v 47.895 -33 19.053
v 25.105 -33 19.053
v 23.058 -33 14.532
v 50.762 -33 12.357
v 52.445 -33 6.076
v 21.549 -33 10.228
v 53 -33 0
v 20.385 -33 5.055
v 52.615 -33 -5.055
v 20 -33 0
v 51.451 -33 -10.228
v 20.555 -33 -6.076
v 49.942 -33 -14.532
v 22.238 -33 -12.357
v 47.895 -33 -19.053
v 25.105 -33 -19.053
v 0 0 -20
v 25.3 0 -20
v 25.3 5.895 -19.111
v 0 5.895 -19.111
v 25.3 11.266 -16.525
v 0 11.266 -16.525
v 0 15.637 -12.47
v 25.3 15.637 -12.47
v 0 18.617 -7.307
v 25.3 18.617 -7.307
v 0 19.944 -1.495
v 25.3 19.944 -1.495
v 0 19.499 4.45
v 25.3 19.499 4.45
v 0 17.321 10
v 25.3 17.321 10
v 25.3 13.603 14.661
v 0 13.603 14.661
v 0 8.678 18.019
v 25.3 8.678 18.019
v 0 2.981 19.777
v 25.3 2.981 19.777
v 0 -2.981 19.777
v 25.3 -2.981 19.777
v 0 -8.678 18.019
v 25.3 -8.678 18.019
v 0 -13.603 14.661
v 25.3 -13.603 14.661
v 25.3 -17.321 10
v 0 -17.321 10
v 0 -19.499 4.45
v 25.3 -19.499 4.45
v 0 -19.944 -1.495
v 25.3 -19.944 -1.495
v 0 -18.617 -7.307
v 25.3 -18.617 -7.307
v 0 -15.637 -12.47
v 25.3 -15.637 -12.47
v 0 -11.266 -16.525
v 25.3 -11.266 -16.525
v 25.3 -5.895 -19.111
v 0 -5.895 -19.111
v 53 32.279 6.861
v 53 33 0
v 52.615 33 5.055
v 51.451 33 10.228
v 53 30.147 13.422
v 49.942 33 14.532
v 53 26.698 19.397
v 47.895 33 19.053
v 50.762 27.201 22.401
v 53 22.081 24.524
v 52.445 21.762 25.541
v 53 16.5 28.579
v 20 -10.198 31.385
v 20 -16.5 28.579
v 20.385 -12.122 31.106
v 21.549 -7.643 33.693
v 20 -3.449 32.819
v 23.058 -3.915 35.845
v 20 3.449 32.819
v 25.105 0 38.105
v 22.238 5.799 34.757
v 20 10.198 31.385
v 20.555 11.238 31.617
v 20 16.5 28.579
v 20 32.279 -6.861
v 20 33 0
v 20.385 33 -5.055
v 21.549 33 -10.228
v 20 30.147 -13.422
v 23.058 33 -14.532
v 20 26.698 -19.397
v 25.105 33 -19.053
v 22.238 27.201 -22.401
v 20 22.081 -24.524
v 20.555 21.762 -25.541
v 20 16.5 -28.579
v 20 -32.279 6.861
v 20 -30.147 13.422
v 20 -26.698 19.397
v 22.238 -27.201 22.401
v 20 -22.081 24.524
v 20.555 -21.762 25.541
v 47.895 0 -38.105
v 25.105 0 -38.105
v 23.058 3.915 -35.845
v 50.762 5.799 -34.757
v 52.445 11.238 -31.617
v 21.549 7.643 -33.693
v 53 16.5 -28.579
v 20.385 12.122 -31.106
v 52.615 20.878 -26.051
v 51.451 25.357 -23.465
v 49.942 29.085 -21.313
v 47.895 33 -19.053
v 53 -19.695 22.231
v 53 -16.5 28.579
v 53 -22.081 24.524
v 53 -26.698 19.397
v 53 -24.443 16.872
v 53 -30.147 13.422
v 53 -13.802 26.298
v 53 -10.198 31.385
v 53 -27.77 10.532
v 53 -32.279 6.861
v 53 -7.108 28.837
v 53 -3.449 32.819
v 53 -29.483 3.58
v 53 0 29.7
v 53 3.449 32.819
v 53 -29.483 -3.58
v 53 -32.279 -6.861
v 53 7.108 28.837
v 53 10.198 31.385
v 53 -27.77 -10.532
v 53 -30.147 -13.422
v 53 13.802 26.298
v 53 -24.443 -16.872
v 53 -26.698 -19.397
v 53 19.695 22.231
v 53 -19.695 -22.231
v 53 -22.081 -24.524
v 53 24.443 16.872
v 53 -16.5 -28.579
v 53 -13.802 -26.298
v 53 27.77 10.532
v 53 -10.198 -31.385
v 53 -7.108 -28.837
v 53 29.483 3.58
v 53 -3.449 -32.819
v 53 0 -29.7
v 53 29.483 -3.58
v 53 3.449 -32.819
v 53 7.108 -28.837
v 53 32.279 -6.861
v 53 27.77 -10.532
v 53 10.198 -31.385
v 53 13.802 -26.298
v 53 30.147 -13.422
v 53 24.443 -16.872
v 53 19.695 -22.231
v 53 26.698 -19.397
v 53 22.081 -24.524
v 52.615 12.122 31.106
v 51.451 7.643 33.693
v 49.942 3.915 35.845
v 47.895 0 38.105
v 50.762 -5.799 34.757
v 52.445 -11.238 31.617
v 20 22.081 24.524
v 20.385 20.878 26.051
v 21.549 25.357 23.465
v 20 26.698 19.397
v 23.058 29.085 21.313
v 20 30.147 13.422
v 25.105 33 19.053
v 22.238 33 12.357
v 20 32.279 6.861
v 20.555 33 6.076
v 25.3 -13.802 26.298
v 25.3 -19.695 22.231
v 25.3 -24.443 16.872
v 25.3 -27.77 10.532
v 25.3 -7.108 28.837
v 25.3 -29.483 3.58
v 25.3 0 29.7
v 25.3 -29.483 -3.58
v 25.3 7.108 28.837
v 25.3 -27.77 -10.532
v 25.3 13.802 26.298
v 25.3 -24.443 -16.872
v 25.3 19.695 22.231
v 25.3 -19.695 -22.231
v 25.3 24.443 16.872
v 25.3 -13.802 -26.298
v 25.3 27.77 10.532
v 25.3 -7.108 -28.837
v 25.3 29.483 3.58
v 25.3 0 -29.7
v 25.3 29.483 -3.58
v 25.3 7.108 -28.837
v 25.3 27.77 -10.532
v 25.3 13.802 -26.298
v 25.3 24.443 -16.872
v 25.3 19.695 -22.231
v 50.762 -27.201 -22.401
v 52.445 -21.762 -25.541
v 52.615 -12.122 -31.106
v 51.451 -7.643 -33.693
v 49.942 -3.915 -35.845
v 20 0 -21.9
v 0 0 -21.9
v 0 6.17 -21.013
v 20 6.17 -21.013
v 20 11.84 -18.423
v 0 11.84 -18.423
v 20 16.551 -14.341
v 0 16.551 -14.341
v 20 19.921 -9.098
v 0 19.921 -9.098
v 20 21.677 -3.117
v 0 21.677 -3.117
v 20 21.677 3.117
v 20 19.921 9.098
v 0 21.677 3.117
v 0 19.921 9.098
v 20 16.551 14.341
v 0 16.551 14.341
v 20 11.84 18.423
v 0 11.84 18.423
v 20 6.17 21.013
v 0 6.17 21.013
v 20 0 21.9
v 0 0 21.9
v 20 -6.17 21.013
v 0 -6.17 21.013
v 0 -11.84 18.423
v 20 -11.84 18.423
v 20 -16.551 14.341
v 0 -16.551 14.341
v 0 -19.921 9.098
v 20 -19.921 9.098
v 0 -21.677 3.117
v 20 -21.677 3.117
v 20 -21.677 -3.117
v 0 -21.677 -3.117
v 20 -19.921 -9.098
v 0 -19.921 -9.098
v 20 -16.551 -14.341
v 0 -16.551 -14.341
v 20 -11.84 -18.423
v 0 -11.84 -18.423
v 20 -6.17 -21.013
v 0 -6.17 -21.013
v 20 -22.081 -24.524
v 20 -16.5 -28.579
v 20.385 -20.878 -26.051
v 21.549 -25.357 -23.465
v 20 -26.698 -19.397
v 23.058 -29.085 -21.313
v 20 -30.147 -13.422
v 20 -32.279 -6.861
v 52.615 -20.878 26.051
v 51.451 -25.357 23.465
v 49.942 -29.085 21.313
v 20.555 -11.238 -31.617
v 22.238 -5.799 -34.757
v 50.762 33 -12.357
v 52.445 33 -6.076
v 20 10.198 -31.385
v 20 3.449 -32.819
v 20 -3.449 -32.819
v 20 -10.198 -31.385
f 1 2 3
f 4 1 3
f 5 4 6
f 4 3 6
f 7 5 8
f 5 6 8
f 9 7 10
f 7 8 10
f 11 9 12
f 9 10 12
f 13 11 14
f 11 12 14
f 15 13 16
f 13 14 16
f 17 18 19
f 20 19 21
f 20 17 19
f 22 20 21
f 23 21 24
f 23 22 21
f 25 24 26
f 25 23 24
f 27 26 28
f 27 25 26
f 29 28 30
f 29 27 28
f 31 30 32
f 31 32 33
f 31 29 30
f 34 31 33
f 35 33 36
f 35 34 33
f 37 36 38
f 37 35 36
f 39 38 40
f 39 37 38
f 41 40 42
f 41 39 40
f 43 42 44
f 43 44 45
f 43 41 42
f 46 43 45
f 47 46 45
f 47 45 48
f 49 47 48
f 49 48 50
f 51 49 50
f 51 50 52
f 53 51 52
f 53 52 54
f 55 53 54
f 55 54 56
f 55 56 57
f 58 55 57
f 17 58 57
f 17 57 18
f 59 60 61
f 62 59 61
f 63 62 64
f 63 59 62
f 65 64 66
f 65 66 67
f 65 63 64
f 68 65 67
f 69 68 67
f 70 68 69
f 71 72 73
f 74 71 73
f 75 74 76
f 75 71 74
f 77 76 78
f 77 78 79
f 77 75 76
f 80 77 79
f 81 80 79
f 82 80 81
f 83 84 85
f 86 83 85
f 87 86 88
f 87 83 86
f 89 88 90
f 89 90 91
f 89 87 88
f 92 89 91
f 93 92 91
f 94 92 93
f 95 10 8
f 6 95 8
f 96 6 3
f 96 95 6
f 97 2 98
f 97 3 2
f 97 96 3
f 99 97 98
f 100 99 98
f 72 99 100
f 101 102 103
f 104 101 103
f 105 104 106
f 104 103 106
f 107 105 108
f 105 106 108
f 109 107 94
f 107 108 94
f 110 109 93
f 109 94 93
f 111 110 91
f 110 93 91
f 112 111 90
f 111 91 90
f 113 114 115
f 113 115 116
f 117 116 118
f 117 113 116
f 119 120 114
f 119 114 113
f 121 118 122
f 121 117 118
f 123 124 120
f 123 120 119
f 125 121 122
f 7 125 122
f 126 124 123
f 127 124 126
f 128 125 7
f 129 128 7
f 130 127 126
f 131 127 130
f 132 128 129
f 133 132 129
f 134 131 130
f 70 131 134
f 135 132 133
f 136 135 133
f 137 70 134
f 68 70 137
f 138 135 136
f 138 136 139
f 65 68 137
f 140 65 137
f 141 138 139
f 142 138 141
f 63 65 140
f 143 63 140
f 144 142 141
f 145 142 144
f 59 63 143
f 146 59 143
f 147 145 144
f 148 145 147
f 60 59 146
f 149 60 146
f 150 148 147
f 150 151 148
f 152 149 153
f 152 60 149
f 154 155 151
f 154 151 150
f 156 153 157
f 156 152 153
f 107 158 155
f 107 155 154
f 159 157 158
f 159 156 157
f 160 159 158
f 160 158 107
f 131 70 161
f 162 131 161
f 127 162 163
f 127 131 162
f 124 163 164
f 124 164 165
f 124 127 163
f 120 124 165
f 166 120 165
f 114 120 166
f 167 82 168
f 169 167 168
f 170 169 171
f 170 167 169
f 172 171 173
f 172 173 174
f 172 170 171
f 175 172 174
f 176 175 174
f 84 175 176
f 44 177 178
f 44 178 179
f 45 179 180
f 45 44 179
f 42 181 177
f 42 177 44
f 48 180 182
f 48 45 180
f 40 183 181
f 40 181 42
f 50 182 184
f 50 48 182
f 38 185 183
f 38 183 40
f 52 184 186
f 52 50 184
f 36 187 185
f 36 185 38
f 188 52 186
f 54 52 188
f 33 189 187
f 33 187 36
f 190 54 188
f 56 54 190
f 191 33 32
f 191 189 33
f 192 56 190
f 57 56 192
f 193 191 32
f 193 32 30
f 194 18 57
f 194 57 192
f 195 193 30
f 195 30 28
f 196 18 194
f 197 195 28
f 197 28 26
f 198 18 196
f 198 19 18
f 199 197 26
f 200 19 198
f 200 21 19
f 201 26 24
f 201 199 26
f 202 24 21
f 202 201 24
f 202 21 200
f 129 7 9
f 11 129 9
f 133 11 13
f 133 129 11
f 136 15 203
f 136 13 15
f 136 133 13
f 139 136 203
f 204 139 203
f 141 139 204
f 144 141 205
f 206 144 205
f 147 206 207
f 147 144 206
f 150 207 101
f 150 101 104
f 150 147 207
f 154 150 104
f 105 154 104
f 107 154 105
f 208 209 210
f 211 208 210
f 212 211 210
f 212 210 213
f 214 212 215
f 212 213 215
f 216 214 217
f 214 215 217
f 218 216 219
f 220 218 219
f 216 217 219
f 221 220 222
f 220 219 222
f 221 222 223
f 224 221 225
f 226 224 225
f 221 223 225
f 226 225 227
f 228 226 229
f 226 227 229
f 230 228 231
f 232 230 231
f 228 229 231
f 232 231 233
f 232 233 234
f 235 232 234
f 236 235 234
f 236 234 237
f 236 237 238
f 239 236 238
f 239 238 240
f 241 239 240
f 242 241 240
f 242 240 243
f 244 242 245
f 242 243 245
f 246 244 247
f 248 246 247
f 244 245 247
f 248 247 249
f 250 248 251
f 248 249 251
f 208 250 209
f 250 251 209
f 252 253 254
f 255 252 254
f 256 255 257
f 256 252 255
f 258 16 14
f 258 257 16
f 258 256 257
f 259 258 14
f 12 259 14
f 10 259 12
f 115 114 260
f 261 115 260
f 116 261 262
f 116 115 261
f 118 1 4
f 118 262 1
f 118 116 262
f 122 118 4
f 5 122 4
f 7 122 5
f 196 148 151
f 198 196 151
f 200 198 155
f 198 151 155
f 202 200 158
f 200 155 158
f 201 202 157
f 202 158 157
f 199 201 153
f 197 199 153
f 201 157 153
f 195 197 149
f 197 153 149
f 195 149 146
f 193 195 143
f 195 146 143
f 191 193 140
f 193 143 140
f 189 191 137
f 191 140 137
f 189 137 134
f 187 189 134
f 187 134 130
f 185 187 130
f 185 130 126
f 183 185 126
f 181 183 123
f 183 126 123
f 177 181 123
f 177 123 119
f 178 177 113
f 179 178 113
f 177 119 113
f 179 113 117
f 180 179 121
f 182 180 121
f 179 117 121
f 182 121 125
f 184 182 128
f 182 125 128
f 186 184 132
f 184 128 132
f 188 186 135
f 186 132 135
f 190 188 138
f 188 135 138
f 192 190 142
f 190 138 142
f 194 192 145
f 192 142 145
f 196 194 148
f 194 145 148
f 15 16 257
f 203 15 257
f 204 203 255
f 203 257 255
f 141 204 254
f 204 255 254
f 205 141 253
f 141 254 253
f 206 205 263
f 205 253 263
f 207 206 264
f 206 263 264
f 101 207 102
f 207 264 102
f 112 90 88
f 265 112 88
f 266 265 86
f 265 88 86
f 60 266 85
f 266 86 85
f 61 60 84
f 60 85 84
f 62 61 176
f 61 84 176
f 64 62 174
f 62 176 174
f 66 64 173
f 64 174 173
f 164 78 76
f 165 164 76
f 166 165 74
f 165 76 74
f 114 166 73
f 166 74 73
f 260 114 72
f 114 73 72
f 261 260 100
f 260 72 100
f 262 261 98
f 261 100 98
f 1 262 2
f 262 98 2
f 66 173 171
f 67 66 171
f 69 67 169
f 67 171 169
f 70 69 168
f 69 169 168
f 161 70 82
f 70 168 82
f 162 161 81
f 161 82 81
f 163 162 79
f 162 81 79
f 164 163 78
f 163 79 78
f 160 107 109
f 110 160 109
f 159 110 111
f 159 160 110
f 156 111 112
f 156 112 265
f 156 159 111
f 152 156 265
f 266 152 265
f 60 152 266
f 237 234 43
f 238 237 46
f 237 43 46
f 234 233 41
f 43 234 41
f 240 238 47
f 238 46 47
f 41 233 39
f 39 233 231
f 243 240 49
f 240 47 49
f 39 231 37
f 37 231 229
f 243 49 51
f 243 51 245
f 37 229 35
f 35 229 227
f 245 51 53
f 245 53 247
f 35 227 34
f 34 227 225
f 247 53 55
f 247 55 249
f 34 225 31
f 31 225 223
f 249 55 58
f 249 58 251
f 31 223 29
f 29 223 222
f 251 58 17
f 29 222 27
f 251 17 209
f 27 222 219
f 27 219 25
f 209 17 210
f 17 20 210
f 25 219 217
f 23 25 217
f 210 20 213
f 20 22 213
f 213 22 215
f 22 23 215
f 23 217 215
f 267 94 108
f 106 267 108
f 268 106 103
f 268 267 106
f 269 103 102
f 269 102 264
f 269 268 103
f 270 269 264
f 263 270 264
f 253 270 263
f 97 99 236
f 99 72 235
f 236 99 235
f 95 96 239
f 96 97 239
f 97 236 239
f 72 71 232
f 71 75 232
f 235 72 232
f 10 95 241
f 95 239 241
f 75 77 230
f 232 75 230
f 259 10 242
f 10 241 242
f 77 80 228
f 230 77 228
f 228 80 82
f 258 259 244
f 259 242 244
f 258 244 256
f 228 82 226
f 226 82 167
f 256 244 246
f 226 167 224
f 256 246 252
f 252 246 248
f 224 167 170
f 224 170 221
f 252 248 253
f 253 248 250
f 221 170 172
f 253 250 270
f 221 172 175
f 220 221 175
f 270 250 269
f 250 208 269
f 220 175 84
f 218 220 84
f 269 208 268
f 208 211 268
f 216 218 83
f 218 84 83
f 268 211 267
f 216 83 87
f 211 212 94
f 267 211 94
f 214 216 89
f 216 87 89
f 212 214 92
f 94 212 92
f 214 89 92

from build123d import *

# Parameters (mm, degrees)
SKETCH_1_R          = 21.9
SKETCH_1_R_2        = 20
EXTRUDE_1_DEPTH     = 20
EXTRUDE_2_DEPTH     = 33
SKETCH_8_OUTSIDE_W  = 120.99
SKETCH_8_OUTSIDE_H  = 110.78
SKETCH_8_OUTSIDE_R  = 33
CUT_EXTRUDE_4_DEPTH = 10
CUT_EXTRUDE_4_DRAFT = -45
SKETCH_9_OUTSIDE_W  = 120.99
SKETCH_9_OUTSIDE_H  = 110.78
SKETCH_9_OUTSIDE_R  = 33
CUT_EXTRUDE_5_DEPTH = 10
CUT_EXTRUDE_5_DRAFT = -45
SKETCH_10_R         = 29.7
CUT_EXTRUDE_6_DEPTH = 27.7
SKETCH_11_R         = 20
CUT_EXTRUDE_7_DEPTH = 58.517736395


with BuildPart() as part:
    # Эскиз1 → Вытянуть-Тонкостенный1 (new body)
    with BuildSketch(Plane(origin=(0, 0, 0), x_dir=(0, 0, -1), z_dir=(1, 0, 0))):
        Circle(SKETCH_1_R)
        Circle(SKETCH_1_R_2, mode=Mode.SUBTRACT)
    extrude(amount=EXTRUDE_1_DEPTH)

    # Эскиз2 → Бобышка-Вытянуть2 (add)
    with BuildSketch(Plane(origin=(20, 0, 0), x_dir=(0, 0, -1), z_dir=(1, 0, 0))):
        Polygon((38.105117767, 0), (19.052558883, 33), (-19.052558883, 33), (-38.105117767, 0), (-19.052558883, -33), (19.052558883, -33), align=None)
    extrude(amount=EXTRUDE_2_DEPTH)


with BuildPart() as cut_extrude_4_tool:
    # Эскиз8 outside → Вырез-Вытянуть4 (with draft: the straight prism first)
    with BuildSketch(Plane.ZY.offset(-20)):
        Rectangle(SKETCH_8_OUTSIDE_W, SKETCH_8_OUTSIDE_H)
        Circle(SKETCH_8_OUTSIDE_R, mode=Mode.SUBTRACT)
    extrude(amount=-CUT_EXTRUDE_4_DEPTH)
    # Вырез-Вытянуть4: the draft: its side faces are tilted about the plane it starts from
    cut_extrude_4_sides = [cut_extrude_4_tool.faces().sort_by_distance(p)[0] for p in [
        (25, -55.39, 0),
        (25, 0, 60.495),
        (25, 55.39, 0),
        (25, 0, -60.495),
        (25, 0, -33),
    ]]
    draft(cut_extrude_4_sides, Plane.ZY.offset(-20), CUT_EXTRUDE_4_DRAFT)


with BuildPart() as part_1:
    add(part.part)

    # Вырез-Вытянуть4: cut by cut_extrude_4_tool
    add(cut_extrude_4_tool.part, mode=Mode.SUBTRACT)


with BuildPart() as cut_extrude_5_tool:
    # Эскиз9 outside → Вырез-Вытянуть5 (with draft: the straight prism first)
    with BuildSketch(Plane(origin=(53, 0, 0), x_dir=(0, 0, -1), z_dir=(1, 0, 0))):
        Rectangle(SKETCH_9_OUTSIDE_W, SKETCH_9_OUTSIDE_H)
        Circle(SKETCH_9_OUTSIDE_R, mode=Mode.SUBTRACT)
    extrude(amount=-CUT_EXTRUDE_5_DEPTH)
    # Вырез-Вытянуть5: the draft: its side faces are tilted about the plane it starts from
    cut_extrude_5_sides = [cut_extrude_5_tool.faces().sort_by_distance(p)[0] for p in [
        (48, -55.39, 0),
        (48, 0, -60.495),
        (48, 55.39, 0),
        (48, 0, 60.495),
        (48, 0, 33),
    ]]
    draft(cut_extrude_5_sides, Plane(origin=(53, 0, 0), x_dir=(0, 0, -1), z_dir=(1, 0, 0)), CUT_EXTRUDE_5_DRAFT)


with BuildPart() as part_2:
    add(part_1.part)

    # Вырез-Вытянуть5: cut by cut_extrude_5_tool
    add(cut_extrude_5_tool.part, mode=Mode.SUBTRACT)

    # Эскиз10 → Вырез-Вытянуть6 (cut)
    with BuildSketch(Plane(origin=(53, 0, 0), x_dir=(0, 0, -1), z_dir=(1, 0, 0))):
        Circle(SKETCH_10_R)
    extrude(amount=-CUT_EXTRUDE_6_DEPTH, mode=Mode.SUBTRACT)

    # Эскиз11 → Вырез-Вытянуть7 (cut, through all)
    with BuildSketch(Plane(origin=(25.3, 0, 0), x_dir=(0, 0, -1), z_dir=(1, 0, 0))):
        Circle(SKETCH_11_R)
    extrude(amount=-CUT_EXTRUDE_7_DEPTH, mode=Mode.SUBTRACT)


solid = part_2.part
